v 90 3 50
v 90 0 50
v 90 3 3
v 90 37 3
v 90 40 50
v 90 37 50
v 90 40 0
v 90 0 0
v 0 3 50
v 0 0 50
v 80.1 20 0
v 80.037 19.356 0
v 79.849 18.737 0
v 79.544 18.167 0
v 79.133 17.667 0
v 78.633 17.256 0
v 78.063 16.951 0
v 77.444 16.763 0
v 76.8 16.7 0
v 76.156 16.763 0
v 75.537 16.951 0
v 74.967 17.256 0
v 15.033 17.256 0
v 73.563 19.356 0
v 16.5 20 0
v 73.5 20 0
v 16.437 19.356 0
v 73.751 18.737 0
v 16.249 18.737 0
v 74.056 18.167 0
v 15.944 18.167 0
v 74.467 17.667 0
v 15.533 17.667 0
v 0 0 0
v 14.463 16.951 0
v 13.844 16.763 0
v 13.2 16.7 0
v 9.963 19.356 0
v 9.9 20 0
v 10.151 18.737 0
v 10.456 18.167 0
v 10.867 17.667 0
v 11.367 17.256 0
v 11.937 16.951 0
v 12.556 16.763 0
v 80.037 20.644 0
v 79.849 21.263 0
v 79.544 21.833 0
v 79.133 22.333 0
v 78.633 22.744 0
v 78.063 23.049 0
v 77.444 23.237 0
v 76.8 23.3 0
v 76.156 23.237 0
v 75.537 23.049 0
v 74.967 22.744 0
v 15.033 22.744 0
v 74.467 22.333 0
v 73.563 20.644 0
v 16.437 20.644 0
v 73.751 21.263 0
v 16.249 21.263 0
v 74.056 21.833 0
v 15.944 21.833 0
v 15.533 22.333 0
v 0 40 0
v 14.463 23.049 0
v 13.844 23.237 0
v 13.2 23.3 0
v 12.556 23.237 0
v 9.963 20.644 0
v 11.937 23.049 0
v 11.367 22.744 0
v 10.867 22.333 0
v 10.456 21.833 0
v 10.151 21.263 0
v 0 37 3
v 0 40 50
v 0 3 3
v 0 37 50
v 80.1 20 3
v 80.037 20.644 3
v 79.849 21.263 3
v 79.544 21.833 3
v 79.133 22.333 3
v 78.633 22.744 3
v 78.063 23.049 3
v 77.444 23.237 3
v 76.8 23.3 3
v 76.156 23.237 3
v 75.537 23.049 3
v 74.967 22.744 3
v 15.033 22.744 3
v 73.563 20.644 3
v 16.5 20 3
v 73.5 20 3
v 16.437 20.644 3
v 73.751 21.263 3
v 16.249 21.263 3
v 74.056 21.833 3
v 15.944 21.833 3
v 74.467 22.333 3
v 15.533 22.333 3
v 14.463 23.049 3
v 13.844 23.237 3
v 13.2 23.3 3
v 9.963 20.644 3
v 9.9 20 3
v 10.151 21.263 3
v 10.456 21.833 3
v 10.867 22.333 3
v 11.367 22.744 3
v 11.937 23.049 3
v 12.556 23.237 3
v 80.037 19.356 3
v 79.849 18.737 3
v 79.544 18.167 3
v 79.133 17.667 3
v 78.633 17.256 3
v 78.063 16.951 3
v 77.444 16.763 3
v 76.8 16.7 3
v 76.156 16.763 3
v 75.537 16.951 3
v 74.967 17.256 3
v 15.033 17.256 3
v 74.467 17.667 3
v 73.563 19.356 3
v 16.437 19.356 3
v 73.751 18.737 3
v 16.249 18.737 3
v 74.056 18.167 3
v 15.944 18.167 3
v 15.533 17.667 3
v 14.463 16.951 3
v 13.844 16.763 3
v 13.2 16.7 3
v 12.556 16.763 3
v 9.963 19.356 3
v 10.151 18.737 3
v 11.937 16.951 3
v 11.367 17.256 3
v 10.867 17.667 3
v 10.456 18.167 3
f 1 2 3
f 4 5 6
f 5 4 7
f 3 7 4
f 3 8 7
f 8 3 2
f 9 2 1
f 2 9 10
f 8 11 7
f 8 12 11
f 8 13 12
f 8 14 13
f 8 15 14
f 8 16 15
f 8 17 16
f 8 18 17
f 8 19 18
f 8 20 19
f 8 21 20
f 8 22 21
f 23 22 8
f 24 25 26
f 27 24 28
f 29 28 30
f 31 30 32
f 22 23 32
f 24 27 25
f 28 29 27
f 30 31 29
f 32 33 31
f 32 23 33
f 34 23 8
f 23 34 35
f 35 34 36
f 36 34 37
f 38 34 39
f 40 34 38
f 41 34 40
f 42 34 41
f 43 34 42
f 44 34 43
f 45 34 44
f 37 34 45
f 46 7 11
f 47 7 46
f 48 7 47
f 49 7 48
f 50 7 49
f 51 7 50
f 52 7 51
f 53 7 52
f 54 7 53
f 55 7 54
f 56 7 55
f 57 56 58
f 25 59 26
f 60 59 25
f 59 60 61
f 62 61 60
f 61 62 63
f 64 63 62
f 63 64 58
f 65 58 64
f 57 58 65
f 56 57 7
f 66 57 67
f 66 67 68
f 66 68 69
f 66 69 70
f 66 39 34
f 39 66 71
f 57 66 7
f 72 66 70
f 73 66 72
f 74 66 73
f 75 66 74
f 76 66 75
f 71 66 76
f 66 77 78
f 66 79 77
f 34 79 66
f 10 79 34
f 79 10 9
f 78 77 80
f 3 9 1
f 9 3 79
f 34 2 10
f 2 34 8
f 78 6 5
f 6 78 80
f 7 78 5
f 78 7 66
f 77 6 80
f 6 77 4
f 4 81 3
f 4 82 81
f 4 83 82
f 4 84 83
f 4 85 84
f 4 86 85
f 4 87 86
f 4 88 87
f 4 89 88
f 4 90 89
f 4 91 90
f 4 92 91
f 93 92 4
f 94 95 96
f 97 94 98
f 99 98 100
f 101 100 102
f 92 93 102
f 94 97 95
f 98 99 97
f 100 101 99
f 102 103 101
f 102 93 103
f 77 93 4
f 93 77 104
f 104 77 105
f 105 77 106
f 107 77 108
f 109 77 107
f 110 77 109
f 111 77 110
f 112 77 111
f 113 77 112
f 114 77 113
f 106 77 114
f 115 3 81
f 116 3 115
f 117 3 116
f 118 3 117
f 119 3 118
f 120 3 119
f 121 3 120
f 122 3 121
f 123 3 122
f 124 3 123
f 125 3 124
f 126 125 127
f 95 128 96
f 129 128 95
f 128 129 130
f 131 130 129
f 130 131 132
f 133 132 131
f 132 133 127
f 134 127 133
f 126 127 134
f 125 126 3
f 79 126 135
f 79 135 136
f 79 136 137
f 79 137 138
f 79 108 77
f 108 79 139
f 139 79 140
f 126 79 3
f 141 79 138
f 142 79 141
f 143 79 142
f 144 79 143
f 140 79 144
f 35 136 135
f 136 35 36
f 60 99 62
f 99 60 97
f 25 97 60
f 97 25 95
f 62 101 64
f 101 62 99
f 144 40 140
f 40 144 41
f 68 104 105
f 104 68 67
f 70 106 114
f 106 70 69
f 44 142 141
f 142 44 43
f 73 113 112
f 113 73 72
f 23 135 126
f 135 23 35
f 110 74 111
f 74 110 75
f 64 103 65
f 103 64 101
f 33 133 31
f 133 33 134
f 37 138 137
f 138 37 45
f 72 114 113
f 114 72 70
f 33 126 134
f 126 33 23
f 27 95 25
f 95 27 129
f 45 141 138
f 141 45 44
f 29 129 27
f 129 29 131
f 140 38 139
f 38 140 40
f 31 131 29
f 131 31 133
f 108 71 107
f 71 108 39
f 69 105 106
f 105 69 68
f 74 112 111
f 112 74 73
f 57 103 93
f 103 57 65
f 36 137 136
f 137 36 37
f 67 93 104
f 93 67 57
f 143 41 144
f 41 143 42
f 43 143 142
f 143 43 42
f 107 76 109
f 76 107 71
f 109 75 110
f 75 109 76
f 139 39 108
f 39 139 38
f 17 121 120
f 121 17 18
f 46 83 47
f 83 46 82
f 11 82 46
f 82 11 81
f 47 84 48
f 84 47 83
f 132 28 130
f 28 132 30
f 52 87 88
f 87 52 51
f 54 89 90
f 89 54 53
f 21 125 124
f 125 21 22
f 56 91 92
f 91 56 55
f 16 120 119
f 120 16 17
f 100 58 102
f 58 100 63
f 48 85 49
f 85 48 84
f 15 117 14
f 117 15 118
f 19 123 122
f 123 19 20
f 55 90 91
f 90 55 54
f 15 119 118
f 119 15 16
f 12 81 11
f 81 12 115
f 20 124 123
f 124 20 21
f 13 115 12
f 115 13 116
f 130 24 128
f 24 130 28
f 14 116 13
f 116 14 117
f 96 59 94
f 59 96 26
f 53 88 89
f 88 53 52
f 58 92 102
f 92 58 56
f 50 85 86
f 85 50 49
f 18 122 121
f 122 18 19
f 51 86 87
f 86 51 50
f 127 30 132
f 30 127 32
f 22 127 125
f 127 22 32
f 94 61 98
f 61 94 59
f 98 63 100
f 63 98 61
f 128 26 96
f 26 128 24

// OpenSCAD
$fn = 32;

// ----------------------------------------------------------------------
// U-bracket: 90 x 40 x 50 mm
// ----------------------------------------------------------------------

// --- parameters (mm) ---
base_len = 90;            // outer length, X
channel_w = 40;           // outer width, Y
upright_h = 50;           // upright height, Z
mat_t = 3;                // wall thickness
hole_d = 6.6;             // clearance for M6

module hole_z(px, py) {
  translate([px, py, -0.5]) cylinder(h = mat_t + 1, d = hole_d);
}
module hole_y_pz(pz) {
  /* through both uprights along Y */
  translate([0, -0.5, pz]) rotate([-90, 0, 0]) cylinder(h = channel_w + 1, d = hole_d);
}

module base() {
  cube([base_len, channel_w, mat_t]);
}

module uprights() {
  cube([base_len, mat_t, upright_h]);
  translate([0, channel_w - mat_t, 0]) cube([base_len, mat_t, upright_h]);
}

difference() {
  union() {
    base();
    uprights();
  }
  hole_z(13.2, 20);
  hole_z(76.8, 20);
}
